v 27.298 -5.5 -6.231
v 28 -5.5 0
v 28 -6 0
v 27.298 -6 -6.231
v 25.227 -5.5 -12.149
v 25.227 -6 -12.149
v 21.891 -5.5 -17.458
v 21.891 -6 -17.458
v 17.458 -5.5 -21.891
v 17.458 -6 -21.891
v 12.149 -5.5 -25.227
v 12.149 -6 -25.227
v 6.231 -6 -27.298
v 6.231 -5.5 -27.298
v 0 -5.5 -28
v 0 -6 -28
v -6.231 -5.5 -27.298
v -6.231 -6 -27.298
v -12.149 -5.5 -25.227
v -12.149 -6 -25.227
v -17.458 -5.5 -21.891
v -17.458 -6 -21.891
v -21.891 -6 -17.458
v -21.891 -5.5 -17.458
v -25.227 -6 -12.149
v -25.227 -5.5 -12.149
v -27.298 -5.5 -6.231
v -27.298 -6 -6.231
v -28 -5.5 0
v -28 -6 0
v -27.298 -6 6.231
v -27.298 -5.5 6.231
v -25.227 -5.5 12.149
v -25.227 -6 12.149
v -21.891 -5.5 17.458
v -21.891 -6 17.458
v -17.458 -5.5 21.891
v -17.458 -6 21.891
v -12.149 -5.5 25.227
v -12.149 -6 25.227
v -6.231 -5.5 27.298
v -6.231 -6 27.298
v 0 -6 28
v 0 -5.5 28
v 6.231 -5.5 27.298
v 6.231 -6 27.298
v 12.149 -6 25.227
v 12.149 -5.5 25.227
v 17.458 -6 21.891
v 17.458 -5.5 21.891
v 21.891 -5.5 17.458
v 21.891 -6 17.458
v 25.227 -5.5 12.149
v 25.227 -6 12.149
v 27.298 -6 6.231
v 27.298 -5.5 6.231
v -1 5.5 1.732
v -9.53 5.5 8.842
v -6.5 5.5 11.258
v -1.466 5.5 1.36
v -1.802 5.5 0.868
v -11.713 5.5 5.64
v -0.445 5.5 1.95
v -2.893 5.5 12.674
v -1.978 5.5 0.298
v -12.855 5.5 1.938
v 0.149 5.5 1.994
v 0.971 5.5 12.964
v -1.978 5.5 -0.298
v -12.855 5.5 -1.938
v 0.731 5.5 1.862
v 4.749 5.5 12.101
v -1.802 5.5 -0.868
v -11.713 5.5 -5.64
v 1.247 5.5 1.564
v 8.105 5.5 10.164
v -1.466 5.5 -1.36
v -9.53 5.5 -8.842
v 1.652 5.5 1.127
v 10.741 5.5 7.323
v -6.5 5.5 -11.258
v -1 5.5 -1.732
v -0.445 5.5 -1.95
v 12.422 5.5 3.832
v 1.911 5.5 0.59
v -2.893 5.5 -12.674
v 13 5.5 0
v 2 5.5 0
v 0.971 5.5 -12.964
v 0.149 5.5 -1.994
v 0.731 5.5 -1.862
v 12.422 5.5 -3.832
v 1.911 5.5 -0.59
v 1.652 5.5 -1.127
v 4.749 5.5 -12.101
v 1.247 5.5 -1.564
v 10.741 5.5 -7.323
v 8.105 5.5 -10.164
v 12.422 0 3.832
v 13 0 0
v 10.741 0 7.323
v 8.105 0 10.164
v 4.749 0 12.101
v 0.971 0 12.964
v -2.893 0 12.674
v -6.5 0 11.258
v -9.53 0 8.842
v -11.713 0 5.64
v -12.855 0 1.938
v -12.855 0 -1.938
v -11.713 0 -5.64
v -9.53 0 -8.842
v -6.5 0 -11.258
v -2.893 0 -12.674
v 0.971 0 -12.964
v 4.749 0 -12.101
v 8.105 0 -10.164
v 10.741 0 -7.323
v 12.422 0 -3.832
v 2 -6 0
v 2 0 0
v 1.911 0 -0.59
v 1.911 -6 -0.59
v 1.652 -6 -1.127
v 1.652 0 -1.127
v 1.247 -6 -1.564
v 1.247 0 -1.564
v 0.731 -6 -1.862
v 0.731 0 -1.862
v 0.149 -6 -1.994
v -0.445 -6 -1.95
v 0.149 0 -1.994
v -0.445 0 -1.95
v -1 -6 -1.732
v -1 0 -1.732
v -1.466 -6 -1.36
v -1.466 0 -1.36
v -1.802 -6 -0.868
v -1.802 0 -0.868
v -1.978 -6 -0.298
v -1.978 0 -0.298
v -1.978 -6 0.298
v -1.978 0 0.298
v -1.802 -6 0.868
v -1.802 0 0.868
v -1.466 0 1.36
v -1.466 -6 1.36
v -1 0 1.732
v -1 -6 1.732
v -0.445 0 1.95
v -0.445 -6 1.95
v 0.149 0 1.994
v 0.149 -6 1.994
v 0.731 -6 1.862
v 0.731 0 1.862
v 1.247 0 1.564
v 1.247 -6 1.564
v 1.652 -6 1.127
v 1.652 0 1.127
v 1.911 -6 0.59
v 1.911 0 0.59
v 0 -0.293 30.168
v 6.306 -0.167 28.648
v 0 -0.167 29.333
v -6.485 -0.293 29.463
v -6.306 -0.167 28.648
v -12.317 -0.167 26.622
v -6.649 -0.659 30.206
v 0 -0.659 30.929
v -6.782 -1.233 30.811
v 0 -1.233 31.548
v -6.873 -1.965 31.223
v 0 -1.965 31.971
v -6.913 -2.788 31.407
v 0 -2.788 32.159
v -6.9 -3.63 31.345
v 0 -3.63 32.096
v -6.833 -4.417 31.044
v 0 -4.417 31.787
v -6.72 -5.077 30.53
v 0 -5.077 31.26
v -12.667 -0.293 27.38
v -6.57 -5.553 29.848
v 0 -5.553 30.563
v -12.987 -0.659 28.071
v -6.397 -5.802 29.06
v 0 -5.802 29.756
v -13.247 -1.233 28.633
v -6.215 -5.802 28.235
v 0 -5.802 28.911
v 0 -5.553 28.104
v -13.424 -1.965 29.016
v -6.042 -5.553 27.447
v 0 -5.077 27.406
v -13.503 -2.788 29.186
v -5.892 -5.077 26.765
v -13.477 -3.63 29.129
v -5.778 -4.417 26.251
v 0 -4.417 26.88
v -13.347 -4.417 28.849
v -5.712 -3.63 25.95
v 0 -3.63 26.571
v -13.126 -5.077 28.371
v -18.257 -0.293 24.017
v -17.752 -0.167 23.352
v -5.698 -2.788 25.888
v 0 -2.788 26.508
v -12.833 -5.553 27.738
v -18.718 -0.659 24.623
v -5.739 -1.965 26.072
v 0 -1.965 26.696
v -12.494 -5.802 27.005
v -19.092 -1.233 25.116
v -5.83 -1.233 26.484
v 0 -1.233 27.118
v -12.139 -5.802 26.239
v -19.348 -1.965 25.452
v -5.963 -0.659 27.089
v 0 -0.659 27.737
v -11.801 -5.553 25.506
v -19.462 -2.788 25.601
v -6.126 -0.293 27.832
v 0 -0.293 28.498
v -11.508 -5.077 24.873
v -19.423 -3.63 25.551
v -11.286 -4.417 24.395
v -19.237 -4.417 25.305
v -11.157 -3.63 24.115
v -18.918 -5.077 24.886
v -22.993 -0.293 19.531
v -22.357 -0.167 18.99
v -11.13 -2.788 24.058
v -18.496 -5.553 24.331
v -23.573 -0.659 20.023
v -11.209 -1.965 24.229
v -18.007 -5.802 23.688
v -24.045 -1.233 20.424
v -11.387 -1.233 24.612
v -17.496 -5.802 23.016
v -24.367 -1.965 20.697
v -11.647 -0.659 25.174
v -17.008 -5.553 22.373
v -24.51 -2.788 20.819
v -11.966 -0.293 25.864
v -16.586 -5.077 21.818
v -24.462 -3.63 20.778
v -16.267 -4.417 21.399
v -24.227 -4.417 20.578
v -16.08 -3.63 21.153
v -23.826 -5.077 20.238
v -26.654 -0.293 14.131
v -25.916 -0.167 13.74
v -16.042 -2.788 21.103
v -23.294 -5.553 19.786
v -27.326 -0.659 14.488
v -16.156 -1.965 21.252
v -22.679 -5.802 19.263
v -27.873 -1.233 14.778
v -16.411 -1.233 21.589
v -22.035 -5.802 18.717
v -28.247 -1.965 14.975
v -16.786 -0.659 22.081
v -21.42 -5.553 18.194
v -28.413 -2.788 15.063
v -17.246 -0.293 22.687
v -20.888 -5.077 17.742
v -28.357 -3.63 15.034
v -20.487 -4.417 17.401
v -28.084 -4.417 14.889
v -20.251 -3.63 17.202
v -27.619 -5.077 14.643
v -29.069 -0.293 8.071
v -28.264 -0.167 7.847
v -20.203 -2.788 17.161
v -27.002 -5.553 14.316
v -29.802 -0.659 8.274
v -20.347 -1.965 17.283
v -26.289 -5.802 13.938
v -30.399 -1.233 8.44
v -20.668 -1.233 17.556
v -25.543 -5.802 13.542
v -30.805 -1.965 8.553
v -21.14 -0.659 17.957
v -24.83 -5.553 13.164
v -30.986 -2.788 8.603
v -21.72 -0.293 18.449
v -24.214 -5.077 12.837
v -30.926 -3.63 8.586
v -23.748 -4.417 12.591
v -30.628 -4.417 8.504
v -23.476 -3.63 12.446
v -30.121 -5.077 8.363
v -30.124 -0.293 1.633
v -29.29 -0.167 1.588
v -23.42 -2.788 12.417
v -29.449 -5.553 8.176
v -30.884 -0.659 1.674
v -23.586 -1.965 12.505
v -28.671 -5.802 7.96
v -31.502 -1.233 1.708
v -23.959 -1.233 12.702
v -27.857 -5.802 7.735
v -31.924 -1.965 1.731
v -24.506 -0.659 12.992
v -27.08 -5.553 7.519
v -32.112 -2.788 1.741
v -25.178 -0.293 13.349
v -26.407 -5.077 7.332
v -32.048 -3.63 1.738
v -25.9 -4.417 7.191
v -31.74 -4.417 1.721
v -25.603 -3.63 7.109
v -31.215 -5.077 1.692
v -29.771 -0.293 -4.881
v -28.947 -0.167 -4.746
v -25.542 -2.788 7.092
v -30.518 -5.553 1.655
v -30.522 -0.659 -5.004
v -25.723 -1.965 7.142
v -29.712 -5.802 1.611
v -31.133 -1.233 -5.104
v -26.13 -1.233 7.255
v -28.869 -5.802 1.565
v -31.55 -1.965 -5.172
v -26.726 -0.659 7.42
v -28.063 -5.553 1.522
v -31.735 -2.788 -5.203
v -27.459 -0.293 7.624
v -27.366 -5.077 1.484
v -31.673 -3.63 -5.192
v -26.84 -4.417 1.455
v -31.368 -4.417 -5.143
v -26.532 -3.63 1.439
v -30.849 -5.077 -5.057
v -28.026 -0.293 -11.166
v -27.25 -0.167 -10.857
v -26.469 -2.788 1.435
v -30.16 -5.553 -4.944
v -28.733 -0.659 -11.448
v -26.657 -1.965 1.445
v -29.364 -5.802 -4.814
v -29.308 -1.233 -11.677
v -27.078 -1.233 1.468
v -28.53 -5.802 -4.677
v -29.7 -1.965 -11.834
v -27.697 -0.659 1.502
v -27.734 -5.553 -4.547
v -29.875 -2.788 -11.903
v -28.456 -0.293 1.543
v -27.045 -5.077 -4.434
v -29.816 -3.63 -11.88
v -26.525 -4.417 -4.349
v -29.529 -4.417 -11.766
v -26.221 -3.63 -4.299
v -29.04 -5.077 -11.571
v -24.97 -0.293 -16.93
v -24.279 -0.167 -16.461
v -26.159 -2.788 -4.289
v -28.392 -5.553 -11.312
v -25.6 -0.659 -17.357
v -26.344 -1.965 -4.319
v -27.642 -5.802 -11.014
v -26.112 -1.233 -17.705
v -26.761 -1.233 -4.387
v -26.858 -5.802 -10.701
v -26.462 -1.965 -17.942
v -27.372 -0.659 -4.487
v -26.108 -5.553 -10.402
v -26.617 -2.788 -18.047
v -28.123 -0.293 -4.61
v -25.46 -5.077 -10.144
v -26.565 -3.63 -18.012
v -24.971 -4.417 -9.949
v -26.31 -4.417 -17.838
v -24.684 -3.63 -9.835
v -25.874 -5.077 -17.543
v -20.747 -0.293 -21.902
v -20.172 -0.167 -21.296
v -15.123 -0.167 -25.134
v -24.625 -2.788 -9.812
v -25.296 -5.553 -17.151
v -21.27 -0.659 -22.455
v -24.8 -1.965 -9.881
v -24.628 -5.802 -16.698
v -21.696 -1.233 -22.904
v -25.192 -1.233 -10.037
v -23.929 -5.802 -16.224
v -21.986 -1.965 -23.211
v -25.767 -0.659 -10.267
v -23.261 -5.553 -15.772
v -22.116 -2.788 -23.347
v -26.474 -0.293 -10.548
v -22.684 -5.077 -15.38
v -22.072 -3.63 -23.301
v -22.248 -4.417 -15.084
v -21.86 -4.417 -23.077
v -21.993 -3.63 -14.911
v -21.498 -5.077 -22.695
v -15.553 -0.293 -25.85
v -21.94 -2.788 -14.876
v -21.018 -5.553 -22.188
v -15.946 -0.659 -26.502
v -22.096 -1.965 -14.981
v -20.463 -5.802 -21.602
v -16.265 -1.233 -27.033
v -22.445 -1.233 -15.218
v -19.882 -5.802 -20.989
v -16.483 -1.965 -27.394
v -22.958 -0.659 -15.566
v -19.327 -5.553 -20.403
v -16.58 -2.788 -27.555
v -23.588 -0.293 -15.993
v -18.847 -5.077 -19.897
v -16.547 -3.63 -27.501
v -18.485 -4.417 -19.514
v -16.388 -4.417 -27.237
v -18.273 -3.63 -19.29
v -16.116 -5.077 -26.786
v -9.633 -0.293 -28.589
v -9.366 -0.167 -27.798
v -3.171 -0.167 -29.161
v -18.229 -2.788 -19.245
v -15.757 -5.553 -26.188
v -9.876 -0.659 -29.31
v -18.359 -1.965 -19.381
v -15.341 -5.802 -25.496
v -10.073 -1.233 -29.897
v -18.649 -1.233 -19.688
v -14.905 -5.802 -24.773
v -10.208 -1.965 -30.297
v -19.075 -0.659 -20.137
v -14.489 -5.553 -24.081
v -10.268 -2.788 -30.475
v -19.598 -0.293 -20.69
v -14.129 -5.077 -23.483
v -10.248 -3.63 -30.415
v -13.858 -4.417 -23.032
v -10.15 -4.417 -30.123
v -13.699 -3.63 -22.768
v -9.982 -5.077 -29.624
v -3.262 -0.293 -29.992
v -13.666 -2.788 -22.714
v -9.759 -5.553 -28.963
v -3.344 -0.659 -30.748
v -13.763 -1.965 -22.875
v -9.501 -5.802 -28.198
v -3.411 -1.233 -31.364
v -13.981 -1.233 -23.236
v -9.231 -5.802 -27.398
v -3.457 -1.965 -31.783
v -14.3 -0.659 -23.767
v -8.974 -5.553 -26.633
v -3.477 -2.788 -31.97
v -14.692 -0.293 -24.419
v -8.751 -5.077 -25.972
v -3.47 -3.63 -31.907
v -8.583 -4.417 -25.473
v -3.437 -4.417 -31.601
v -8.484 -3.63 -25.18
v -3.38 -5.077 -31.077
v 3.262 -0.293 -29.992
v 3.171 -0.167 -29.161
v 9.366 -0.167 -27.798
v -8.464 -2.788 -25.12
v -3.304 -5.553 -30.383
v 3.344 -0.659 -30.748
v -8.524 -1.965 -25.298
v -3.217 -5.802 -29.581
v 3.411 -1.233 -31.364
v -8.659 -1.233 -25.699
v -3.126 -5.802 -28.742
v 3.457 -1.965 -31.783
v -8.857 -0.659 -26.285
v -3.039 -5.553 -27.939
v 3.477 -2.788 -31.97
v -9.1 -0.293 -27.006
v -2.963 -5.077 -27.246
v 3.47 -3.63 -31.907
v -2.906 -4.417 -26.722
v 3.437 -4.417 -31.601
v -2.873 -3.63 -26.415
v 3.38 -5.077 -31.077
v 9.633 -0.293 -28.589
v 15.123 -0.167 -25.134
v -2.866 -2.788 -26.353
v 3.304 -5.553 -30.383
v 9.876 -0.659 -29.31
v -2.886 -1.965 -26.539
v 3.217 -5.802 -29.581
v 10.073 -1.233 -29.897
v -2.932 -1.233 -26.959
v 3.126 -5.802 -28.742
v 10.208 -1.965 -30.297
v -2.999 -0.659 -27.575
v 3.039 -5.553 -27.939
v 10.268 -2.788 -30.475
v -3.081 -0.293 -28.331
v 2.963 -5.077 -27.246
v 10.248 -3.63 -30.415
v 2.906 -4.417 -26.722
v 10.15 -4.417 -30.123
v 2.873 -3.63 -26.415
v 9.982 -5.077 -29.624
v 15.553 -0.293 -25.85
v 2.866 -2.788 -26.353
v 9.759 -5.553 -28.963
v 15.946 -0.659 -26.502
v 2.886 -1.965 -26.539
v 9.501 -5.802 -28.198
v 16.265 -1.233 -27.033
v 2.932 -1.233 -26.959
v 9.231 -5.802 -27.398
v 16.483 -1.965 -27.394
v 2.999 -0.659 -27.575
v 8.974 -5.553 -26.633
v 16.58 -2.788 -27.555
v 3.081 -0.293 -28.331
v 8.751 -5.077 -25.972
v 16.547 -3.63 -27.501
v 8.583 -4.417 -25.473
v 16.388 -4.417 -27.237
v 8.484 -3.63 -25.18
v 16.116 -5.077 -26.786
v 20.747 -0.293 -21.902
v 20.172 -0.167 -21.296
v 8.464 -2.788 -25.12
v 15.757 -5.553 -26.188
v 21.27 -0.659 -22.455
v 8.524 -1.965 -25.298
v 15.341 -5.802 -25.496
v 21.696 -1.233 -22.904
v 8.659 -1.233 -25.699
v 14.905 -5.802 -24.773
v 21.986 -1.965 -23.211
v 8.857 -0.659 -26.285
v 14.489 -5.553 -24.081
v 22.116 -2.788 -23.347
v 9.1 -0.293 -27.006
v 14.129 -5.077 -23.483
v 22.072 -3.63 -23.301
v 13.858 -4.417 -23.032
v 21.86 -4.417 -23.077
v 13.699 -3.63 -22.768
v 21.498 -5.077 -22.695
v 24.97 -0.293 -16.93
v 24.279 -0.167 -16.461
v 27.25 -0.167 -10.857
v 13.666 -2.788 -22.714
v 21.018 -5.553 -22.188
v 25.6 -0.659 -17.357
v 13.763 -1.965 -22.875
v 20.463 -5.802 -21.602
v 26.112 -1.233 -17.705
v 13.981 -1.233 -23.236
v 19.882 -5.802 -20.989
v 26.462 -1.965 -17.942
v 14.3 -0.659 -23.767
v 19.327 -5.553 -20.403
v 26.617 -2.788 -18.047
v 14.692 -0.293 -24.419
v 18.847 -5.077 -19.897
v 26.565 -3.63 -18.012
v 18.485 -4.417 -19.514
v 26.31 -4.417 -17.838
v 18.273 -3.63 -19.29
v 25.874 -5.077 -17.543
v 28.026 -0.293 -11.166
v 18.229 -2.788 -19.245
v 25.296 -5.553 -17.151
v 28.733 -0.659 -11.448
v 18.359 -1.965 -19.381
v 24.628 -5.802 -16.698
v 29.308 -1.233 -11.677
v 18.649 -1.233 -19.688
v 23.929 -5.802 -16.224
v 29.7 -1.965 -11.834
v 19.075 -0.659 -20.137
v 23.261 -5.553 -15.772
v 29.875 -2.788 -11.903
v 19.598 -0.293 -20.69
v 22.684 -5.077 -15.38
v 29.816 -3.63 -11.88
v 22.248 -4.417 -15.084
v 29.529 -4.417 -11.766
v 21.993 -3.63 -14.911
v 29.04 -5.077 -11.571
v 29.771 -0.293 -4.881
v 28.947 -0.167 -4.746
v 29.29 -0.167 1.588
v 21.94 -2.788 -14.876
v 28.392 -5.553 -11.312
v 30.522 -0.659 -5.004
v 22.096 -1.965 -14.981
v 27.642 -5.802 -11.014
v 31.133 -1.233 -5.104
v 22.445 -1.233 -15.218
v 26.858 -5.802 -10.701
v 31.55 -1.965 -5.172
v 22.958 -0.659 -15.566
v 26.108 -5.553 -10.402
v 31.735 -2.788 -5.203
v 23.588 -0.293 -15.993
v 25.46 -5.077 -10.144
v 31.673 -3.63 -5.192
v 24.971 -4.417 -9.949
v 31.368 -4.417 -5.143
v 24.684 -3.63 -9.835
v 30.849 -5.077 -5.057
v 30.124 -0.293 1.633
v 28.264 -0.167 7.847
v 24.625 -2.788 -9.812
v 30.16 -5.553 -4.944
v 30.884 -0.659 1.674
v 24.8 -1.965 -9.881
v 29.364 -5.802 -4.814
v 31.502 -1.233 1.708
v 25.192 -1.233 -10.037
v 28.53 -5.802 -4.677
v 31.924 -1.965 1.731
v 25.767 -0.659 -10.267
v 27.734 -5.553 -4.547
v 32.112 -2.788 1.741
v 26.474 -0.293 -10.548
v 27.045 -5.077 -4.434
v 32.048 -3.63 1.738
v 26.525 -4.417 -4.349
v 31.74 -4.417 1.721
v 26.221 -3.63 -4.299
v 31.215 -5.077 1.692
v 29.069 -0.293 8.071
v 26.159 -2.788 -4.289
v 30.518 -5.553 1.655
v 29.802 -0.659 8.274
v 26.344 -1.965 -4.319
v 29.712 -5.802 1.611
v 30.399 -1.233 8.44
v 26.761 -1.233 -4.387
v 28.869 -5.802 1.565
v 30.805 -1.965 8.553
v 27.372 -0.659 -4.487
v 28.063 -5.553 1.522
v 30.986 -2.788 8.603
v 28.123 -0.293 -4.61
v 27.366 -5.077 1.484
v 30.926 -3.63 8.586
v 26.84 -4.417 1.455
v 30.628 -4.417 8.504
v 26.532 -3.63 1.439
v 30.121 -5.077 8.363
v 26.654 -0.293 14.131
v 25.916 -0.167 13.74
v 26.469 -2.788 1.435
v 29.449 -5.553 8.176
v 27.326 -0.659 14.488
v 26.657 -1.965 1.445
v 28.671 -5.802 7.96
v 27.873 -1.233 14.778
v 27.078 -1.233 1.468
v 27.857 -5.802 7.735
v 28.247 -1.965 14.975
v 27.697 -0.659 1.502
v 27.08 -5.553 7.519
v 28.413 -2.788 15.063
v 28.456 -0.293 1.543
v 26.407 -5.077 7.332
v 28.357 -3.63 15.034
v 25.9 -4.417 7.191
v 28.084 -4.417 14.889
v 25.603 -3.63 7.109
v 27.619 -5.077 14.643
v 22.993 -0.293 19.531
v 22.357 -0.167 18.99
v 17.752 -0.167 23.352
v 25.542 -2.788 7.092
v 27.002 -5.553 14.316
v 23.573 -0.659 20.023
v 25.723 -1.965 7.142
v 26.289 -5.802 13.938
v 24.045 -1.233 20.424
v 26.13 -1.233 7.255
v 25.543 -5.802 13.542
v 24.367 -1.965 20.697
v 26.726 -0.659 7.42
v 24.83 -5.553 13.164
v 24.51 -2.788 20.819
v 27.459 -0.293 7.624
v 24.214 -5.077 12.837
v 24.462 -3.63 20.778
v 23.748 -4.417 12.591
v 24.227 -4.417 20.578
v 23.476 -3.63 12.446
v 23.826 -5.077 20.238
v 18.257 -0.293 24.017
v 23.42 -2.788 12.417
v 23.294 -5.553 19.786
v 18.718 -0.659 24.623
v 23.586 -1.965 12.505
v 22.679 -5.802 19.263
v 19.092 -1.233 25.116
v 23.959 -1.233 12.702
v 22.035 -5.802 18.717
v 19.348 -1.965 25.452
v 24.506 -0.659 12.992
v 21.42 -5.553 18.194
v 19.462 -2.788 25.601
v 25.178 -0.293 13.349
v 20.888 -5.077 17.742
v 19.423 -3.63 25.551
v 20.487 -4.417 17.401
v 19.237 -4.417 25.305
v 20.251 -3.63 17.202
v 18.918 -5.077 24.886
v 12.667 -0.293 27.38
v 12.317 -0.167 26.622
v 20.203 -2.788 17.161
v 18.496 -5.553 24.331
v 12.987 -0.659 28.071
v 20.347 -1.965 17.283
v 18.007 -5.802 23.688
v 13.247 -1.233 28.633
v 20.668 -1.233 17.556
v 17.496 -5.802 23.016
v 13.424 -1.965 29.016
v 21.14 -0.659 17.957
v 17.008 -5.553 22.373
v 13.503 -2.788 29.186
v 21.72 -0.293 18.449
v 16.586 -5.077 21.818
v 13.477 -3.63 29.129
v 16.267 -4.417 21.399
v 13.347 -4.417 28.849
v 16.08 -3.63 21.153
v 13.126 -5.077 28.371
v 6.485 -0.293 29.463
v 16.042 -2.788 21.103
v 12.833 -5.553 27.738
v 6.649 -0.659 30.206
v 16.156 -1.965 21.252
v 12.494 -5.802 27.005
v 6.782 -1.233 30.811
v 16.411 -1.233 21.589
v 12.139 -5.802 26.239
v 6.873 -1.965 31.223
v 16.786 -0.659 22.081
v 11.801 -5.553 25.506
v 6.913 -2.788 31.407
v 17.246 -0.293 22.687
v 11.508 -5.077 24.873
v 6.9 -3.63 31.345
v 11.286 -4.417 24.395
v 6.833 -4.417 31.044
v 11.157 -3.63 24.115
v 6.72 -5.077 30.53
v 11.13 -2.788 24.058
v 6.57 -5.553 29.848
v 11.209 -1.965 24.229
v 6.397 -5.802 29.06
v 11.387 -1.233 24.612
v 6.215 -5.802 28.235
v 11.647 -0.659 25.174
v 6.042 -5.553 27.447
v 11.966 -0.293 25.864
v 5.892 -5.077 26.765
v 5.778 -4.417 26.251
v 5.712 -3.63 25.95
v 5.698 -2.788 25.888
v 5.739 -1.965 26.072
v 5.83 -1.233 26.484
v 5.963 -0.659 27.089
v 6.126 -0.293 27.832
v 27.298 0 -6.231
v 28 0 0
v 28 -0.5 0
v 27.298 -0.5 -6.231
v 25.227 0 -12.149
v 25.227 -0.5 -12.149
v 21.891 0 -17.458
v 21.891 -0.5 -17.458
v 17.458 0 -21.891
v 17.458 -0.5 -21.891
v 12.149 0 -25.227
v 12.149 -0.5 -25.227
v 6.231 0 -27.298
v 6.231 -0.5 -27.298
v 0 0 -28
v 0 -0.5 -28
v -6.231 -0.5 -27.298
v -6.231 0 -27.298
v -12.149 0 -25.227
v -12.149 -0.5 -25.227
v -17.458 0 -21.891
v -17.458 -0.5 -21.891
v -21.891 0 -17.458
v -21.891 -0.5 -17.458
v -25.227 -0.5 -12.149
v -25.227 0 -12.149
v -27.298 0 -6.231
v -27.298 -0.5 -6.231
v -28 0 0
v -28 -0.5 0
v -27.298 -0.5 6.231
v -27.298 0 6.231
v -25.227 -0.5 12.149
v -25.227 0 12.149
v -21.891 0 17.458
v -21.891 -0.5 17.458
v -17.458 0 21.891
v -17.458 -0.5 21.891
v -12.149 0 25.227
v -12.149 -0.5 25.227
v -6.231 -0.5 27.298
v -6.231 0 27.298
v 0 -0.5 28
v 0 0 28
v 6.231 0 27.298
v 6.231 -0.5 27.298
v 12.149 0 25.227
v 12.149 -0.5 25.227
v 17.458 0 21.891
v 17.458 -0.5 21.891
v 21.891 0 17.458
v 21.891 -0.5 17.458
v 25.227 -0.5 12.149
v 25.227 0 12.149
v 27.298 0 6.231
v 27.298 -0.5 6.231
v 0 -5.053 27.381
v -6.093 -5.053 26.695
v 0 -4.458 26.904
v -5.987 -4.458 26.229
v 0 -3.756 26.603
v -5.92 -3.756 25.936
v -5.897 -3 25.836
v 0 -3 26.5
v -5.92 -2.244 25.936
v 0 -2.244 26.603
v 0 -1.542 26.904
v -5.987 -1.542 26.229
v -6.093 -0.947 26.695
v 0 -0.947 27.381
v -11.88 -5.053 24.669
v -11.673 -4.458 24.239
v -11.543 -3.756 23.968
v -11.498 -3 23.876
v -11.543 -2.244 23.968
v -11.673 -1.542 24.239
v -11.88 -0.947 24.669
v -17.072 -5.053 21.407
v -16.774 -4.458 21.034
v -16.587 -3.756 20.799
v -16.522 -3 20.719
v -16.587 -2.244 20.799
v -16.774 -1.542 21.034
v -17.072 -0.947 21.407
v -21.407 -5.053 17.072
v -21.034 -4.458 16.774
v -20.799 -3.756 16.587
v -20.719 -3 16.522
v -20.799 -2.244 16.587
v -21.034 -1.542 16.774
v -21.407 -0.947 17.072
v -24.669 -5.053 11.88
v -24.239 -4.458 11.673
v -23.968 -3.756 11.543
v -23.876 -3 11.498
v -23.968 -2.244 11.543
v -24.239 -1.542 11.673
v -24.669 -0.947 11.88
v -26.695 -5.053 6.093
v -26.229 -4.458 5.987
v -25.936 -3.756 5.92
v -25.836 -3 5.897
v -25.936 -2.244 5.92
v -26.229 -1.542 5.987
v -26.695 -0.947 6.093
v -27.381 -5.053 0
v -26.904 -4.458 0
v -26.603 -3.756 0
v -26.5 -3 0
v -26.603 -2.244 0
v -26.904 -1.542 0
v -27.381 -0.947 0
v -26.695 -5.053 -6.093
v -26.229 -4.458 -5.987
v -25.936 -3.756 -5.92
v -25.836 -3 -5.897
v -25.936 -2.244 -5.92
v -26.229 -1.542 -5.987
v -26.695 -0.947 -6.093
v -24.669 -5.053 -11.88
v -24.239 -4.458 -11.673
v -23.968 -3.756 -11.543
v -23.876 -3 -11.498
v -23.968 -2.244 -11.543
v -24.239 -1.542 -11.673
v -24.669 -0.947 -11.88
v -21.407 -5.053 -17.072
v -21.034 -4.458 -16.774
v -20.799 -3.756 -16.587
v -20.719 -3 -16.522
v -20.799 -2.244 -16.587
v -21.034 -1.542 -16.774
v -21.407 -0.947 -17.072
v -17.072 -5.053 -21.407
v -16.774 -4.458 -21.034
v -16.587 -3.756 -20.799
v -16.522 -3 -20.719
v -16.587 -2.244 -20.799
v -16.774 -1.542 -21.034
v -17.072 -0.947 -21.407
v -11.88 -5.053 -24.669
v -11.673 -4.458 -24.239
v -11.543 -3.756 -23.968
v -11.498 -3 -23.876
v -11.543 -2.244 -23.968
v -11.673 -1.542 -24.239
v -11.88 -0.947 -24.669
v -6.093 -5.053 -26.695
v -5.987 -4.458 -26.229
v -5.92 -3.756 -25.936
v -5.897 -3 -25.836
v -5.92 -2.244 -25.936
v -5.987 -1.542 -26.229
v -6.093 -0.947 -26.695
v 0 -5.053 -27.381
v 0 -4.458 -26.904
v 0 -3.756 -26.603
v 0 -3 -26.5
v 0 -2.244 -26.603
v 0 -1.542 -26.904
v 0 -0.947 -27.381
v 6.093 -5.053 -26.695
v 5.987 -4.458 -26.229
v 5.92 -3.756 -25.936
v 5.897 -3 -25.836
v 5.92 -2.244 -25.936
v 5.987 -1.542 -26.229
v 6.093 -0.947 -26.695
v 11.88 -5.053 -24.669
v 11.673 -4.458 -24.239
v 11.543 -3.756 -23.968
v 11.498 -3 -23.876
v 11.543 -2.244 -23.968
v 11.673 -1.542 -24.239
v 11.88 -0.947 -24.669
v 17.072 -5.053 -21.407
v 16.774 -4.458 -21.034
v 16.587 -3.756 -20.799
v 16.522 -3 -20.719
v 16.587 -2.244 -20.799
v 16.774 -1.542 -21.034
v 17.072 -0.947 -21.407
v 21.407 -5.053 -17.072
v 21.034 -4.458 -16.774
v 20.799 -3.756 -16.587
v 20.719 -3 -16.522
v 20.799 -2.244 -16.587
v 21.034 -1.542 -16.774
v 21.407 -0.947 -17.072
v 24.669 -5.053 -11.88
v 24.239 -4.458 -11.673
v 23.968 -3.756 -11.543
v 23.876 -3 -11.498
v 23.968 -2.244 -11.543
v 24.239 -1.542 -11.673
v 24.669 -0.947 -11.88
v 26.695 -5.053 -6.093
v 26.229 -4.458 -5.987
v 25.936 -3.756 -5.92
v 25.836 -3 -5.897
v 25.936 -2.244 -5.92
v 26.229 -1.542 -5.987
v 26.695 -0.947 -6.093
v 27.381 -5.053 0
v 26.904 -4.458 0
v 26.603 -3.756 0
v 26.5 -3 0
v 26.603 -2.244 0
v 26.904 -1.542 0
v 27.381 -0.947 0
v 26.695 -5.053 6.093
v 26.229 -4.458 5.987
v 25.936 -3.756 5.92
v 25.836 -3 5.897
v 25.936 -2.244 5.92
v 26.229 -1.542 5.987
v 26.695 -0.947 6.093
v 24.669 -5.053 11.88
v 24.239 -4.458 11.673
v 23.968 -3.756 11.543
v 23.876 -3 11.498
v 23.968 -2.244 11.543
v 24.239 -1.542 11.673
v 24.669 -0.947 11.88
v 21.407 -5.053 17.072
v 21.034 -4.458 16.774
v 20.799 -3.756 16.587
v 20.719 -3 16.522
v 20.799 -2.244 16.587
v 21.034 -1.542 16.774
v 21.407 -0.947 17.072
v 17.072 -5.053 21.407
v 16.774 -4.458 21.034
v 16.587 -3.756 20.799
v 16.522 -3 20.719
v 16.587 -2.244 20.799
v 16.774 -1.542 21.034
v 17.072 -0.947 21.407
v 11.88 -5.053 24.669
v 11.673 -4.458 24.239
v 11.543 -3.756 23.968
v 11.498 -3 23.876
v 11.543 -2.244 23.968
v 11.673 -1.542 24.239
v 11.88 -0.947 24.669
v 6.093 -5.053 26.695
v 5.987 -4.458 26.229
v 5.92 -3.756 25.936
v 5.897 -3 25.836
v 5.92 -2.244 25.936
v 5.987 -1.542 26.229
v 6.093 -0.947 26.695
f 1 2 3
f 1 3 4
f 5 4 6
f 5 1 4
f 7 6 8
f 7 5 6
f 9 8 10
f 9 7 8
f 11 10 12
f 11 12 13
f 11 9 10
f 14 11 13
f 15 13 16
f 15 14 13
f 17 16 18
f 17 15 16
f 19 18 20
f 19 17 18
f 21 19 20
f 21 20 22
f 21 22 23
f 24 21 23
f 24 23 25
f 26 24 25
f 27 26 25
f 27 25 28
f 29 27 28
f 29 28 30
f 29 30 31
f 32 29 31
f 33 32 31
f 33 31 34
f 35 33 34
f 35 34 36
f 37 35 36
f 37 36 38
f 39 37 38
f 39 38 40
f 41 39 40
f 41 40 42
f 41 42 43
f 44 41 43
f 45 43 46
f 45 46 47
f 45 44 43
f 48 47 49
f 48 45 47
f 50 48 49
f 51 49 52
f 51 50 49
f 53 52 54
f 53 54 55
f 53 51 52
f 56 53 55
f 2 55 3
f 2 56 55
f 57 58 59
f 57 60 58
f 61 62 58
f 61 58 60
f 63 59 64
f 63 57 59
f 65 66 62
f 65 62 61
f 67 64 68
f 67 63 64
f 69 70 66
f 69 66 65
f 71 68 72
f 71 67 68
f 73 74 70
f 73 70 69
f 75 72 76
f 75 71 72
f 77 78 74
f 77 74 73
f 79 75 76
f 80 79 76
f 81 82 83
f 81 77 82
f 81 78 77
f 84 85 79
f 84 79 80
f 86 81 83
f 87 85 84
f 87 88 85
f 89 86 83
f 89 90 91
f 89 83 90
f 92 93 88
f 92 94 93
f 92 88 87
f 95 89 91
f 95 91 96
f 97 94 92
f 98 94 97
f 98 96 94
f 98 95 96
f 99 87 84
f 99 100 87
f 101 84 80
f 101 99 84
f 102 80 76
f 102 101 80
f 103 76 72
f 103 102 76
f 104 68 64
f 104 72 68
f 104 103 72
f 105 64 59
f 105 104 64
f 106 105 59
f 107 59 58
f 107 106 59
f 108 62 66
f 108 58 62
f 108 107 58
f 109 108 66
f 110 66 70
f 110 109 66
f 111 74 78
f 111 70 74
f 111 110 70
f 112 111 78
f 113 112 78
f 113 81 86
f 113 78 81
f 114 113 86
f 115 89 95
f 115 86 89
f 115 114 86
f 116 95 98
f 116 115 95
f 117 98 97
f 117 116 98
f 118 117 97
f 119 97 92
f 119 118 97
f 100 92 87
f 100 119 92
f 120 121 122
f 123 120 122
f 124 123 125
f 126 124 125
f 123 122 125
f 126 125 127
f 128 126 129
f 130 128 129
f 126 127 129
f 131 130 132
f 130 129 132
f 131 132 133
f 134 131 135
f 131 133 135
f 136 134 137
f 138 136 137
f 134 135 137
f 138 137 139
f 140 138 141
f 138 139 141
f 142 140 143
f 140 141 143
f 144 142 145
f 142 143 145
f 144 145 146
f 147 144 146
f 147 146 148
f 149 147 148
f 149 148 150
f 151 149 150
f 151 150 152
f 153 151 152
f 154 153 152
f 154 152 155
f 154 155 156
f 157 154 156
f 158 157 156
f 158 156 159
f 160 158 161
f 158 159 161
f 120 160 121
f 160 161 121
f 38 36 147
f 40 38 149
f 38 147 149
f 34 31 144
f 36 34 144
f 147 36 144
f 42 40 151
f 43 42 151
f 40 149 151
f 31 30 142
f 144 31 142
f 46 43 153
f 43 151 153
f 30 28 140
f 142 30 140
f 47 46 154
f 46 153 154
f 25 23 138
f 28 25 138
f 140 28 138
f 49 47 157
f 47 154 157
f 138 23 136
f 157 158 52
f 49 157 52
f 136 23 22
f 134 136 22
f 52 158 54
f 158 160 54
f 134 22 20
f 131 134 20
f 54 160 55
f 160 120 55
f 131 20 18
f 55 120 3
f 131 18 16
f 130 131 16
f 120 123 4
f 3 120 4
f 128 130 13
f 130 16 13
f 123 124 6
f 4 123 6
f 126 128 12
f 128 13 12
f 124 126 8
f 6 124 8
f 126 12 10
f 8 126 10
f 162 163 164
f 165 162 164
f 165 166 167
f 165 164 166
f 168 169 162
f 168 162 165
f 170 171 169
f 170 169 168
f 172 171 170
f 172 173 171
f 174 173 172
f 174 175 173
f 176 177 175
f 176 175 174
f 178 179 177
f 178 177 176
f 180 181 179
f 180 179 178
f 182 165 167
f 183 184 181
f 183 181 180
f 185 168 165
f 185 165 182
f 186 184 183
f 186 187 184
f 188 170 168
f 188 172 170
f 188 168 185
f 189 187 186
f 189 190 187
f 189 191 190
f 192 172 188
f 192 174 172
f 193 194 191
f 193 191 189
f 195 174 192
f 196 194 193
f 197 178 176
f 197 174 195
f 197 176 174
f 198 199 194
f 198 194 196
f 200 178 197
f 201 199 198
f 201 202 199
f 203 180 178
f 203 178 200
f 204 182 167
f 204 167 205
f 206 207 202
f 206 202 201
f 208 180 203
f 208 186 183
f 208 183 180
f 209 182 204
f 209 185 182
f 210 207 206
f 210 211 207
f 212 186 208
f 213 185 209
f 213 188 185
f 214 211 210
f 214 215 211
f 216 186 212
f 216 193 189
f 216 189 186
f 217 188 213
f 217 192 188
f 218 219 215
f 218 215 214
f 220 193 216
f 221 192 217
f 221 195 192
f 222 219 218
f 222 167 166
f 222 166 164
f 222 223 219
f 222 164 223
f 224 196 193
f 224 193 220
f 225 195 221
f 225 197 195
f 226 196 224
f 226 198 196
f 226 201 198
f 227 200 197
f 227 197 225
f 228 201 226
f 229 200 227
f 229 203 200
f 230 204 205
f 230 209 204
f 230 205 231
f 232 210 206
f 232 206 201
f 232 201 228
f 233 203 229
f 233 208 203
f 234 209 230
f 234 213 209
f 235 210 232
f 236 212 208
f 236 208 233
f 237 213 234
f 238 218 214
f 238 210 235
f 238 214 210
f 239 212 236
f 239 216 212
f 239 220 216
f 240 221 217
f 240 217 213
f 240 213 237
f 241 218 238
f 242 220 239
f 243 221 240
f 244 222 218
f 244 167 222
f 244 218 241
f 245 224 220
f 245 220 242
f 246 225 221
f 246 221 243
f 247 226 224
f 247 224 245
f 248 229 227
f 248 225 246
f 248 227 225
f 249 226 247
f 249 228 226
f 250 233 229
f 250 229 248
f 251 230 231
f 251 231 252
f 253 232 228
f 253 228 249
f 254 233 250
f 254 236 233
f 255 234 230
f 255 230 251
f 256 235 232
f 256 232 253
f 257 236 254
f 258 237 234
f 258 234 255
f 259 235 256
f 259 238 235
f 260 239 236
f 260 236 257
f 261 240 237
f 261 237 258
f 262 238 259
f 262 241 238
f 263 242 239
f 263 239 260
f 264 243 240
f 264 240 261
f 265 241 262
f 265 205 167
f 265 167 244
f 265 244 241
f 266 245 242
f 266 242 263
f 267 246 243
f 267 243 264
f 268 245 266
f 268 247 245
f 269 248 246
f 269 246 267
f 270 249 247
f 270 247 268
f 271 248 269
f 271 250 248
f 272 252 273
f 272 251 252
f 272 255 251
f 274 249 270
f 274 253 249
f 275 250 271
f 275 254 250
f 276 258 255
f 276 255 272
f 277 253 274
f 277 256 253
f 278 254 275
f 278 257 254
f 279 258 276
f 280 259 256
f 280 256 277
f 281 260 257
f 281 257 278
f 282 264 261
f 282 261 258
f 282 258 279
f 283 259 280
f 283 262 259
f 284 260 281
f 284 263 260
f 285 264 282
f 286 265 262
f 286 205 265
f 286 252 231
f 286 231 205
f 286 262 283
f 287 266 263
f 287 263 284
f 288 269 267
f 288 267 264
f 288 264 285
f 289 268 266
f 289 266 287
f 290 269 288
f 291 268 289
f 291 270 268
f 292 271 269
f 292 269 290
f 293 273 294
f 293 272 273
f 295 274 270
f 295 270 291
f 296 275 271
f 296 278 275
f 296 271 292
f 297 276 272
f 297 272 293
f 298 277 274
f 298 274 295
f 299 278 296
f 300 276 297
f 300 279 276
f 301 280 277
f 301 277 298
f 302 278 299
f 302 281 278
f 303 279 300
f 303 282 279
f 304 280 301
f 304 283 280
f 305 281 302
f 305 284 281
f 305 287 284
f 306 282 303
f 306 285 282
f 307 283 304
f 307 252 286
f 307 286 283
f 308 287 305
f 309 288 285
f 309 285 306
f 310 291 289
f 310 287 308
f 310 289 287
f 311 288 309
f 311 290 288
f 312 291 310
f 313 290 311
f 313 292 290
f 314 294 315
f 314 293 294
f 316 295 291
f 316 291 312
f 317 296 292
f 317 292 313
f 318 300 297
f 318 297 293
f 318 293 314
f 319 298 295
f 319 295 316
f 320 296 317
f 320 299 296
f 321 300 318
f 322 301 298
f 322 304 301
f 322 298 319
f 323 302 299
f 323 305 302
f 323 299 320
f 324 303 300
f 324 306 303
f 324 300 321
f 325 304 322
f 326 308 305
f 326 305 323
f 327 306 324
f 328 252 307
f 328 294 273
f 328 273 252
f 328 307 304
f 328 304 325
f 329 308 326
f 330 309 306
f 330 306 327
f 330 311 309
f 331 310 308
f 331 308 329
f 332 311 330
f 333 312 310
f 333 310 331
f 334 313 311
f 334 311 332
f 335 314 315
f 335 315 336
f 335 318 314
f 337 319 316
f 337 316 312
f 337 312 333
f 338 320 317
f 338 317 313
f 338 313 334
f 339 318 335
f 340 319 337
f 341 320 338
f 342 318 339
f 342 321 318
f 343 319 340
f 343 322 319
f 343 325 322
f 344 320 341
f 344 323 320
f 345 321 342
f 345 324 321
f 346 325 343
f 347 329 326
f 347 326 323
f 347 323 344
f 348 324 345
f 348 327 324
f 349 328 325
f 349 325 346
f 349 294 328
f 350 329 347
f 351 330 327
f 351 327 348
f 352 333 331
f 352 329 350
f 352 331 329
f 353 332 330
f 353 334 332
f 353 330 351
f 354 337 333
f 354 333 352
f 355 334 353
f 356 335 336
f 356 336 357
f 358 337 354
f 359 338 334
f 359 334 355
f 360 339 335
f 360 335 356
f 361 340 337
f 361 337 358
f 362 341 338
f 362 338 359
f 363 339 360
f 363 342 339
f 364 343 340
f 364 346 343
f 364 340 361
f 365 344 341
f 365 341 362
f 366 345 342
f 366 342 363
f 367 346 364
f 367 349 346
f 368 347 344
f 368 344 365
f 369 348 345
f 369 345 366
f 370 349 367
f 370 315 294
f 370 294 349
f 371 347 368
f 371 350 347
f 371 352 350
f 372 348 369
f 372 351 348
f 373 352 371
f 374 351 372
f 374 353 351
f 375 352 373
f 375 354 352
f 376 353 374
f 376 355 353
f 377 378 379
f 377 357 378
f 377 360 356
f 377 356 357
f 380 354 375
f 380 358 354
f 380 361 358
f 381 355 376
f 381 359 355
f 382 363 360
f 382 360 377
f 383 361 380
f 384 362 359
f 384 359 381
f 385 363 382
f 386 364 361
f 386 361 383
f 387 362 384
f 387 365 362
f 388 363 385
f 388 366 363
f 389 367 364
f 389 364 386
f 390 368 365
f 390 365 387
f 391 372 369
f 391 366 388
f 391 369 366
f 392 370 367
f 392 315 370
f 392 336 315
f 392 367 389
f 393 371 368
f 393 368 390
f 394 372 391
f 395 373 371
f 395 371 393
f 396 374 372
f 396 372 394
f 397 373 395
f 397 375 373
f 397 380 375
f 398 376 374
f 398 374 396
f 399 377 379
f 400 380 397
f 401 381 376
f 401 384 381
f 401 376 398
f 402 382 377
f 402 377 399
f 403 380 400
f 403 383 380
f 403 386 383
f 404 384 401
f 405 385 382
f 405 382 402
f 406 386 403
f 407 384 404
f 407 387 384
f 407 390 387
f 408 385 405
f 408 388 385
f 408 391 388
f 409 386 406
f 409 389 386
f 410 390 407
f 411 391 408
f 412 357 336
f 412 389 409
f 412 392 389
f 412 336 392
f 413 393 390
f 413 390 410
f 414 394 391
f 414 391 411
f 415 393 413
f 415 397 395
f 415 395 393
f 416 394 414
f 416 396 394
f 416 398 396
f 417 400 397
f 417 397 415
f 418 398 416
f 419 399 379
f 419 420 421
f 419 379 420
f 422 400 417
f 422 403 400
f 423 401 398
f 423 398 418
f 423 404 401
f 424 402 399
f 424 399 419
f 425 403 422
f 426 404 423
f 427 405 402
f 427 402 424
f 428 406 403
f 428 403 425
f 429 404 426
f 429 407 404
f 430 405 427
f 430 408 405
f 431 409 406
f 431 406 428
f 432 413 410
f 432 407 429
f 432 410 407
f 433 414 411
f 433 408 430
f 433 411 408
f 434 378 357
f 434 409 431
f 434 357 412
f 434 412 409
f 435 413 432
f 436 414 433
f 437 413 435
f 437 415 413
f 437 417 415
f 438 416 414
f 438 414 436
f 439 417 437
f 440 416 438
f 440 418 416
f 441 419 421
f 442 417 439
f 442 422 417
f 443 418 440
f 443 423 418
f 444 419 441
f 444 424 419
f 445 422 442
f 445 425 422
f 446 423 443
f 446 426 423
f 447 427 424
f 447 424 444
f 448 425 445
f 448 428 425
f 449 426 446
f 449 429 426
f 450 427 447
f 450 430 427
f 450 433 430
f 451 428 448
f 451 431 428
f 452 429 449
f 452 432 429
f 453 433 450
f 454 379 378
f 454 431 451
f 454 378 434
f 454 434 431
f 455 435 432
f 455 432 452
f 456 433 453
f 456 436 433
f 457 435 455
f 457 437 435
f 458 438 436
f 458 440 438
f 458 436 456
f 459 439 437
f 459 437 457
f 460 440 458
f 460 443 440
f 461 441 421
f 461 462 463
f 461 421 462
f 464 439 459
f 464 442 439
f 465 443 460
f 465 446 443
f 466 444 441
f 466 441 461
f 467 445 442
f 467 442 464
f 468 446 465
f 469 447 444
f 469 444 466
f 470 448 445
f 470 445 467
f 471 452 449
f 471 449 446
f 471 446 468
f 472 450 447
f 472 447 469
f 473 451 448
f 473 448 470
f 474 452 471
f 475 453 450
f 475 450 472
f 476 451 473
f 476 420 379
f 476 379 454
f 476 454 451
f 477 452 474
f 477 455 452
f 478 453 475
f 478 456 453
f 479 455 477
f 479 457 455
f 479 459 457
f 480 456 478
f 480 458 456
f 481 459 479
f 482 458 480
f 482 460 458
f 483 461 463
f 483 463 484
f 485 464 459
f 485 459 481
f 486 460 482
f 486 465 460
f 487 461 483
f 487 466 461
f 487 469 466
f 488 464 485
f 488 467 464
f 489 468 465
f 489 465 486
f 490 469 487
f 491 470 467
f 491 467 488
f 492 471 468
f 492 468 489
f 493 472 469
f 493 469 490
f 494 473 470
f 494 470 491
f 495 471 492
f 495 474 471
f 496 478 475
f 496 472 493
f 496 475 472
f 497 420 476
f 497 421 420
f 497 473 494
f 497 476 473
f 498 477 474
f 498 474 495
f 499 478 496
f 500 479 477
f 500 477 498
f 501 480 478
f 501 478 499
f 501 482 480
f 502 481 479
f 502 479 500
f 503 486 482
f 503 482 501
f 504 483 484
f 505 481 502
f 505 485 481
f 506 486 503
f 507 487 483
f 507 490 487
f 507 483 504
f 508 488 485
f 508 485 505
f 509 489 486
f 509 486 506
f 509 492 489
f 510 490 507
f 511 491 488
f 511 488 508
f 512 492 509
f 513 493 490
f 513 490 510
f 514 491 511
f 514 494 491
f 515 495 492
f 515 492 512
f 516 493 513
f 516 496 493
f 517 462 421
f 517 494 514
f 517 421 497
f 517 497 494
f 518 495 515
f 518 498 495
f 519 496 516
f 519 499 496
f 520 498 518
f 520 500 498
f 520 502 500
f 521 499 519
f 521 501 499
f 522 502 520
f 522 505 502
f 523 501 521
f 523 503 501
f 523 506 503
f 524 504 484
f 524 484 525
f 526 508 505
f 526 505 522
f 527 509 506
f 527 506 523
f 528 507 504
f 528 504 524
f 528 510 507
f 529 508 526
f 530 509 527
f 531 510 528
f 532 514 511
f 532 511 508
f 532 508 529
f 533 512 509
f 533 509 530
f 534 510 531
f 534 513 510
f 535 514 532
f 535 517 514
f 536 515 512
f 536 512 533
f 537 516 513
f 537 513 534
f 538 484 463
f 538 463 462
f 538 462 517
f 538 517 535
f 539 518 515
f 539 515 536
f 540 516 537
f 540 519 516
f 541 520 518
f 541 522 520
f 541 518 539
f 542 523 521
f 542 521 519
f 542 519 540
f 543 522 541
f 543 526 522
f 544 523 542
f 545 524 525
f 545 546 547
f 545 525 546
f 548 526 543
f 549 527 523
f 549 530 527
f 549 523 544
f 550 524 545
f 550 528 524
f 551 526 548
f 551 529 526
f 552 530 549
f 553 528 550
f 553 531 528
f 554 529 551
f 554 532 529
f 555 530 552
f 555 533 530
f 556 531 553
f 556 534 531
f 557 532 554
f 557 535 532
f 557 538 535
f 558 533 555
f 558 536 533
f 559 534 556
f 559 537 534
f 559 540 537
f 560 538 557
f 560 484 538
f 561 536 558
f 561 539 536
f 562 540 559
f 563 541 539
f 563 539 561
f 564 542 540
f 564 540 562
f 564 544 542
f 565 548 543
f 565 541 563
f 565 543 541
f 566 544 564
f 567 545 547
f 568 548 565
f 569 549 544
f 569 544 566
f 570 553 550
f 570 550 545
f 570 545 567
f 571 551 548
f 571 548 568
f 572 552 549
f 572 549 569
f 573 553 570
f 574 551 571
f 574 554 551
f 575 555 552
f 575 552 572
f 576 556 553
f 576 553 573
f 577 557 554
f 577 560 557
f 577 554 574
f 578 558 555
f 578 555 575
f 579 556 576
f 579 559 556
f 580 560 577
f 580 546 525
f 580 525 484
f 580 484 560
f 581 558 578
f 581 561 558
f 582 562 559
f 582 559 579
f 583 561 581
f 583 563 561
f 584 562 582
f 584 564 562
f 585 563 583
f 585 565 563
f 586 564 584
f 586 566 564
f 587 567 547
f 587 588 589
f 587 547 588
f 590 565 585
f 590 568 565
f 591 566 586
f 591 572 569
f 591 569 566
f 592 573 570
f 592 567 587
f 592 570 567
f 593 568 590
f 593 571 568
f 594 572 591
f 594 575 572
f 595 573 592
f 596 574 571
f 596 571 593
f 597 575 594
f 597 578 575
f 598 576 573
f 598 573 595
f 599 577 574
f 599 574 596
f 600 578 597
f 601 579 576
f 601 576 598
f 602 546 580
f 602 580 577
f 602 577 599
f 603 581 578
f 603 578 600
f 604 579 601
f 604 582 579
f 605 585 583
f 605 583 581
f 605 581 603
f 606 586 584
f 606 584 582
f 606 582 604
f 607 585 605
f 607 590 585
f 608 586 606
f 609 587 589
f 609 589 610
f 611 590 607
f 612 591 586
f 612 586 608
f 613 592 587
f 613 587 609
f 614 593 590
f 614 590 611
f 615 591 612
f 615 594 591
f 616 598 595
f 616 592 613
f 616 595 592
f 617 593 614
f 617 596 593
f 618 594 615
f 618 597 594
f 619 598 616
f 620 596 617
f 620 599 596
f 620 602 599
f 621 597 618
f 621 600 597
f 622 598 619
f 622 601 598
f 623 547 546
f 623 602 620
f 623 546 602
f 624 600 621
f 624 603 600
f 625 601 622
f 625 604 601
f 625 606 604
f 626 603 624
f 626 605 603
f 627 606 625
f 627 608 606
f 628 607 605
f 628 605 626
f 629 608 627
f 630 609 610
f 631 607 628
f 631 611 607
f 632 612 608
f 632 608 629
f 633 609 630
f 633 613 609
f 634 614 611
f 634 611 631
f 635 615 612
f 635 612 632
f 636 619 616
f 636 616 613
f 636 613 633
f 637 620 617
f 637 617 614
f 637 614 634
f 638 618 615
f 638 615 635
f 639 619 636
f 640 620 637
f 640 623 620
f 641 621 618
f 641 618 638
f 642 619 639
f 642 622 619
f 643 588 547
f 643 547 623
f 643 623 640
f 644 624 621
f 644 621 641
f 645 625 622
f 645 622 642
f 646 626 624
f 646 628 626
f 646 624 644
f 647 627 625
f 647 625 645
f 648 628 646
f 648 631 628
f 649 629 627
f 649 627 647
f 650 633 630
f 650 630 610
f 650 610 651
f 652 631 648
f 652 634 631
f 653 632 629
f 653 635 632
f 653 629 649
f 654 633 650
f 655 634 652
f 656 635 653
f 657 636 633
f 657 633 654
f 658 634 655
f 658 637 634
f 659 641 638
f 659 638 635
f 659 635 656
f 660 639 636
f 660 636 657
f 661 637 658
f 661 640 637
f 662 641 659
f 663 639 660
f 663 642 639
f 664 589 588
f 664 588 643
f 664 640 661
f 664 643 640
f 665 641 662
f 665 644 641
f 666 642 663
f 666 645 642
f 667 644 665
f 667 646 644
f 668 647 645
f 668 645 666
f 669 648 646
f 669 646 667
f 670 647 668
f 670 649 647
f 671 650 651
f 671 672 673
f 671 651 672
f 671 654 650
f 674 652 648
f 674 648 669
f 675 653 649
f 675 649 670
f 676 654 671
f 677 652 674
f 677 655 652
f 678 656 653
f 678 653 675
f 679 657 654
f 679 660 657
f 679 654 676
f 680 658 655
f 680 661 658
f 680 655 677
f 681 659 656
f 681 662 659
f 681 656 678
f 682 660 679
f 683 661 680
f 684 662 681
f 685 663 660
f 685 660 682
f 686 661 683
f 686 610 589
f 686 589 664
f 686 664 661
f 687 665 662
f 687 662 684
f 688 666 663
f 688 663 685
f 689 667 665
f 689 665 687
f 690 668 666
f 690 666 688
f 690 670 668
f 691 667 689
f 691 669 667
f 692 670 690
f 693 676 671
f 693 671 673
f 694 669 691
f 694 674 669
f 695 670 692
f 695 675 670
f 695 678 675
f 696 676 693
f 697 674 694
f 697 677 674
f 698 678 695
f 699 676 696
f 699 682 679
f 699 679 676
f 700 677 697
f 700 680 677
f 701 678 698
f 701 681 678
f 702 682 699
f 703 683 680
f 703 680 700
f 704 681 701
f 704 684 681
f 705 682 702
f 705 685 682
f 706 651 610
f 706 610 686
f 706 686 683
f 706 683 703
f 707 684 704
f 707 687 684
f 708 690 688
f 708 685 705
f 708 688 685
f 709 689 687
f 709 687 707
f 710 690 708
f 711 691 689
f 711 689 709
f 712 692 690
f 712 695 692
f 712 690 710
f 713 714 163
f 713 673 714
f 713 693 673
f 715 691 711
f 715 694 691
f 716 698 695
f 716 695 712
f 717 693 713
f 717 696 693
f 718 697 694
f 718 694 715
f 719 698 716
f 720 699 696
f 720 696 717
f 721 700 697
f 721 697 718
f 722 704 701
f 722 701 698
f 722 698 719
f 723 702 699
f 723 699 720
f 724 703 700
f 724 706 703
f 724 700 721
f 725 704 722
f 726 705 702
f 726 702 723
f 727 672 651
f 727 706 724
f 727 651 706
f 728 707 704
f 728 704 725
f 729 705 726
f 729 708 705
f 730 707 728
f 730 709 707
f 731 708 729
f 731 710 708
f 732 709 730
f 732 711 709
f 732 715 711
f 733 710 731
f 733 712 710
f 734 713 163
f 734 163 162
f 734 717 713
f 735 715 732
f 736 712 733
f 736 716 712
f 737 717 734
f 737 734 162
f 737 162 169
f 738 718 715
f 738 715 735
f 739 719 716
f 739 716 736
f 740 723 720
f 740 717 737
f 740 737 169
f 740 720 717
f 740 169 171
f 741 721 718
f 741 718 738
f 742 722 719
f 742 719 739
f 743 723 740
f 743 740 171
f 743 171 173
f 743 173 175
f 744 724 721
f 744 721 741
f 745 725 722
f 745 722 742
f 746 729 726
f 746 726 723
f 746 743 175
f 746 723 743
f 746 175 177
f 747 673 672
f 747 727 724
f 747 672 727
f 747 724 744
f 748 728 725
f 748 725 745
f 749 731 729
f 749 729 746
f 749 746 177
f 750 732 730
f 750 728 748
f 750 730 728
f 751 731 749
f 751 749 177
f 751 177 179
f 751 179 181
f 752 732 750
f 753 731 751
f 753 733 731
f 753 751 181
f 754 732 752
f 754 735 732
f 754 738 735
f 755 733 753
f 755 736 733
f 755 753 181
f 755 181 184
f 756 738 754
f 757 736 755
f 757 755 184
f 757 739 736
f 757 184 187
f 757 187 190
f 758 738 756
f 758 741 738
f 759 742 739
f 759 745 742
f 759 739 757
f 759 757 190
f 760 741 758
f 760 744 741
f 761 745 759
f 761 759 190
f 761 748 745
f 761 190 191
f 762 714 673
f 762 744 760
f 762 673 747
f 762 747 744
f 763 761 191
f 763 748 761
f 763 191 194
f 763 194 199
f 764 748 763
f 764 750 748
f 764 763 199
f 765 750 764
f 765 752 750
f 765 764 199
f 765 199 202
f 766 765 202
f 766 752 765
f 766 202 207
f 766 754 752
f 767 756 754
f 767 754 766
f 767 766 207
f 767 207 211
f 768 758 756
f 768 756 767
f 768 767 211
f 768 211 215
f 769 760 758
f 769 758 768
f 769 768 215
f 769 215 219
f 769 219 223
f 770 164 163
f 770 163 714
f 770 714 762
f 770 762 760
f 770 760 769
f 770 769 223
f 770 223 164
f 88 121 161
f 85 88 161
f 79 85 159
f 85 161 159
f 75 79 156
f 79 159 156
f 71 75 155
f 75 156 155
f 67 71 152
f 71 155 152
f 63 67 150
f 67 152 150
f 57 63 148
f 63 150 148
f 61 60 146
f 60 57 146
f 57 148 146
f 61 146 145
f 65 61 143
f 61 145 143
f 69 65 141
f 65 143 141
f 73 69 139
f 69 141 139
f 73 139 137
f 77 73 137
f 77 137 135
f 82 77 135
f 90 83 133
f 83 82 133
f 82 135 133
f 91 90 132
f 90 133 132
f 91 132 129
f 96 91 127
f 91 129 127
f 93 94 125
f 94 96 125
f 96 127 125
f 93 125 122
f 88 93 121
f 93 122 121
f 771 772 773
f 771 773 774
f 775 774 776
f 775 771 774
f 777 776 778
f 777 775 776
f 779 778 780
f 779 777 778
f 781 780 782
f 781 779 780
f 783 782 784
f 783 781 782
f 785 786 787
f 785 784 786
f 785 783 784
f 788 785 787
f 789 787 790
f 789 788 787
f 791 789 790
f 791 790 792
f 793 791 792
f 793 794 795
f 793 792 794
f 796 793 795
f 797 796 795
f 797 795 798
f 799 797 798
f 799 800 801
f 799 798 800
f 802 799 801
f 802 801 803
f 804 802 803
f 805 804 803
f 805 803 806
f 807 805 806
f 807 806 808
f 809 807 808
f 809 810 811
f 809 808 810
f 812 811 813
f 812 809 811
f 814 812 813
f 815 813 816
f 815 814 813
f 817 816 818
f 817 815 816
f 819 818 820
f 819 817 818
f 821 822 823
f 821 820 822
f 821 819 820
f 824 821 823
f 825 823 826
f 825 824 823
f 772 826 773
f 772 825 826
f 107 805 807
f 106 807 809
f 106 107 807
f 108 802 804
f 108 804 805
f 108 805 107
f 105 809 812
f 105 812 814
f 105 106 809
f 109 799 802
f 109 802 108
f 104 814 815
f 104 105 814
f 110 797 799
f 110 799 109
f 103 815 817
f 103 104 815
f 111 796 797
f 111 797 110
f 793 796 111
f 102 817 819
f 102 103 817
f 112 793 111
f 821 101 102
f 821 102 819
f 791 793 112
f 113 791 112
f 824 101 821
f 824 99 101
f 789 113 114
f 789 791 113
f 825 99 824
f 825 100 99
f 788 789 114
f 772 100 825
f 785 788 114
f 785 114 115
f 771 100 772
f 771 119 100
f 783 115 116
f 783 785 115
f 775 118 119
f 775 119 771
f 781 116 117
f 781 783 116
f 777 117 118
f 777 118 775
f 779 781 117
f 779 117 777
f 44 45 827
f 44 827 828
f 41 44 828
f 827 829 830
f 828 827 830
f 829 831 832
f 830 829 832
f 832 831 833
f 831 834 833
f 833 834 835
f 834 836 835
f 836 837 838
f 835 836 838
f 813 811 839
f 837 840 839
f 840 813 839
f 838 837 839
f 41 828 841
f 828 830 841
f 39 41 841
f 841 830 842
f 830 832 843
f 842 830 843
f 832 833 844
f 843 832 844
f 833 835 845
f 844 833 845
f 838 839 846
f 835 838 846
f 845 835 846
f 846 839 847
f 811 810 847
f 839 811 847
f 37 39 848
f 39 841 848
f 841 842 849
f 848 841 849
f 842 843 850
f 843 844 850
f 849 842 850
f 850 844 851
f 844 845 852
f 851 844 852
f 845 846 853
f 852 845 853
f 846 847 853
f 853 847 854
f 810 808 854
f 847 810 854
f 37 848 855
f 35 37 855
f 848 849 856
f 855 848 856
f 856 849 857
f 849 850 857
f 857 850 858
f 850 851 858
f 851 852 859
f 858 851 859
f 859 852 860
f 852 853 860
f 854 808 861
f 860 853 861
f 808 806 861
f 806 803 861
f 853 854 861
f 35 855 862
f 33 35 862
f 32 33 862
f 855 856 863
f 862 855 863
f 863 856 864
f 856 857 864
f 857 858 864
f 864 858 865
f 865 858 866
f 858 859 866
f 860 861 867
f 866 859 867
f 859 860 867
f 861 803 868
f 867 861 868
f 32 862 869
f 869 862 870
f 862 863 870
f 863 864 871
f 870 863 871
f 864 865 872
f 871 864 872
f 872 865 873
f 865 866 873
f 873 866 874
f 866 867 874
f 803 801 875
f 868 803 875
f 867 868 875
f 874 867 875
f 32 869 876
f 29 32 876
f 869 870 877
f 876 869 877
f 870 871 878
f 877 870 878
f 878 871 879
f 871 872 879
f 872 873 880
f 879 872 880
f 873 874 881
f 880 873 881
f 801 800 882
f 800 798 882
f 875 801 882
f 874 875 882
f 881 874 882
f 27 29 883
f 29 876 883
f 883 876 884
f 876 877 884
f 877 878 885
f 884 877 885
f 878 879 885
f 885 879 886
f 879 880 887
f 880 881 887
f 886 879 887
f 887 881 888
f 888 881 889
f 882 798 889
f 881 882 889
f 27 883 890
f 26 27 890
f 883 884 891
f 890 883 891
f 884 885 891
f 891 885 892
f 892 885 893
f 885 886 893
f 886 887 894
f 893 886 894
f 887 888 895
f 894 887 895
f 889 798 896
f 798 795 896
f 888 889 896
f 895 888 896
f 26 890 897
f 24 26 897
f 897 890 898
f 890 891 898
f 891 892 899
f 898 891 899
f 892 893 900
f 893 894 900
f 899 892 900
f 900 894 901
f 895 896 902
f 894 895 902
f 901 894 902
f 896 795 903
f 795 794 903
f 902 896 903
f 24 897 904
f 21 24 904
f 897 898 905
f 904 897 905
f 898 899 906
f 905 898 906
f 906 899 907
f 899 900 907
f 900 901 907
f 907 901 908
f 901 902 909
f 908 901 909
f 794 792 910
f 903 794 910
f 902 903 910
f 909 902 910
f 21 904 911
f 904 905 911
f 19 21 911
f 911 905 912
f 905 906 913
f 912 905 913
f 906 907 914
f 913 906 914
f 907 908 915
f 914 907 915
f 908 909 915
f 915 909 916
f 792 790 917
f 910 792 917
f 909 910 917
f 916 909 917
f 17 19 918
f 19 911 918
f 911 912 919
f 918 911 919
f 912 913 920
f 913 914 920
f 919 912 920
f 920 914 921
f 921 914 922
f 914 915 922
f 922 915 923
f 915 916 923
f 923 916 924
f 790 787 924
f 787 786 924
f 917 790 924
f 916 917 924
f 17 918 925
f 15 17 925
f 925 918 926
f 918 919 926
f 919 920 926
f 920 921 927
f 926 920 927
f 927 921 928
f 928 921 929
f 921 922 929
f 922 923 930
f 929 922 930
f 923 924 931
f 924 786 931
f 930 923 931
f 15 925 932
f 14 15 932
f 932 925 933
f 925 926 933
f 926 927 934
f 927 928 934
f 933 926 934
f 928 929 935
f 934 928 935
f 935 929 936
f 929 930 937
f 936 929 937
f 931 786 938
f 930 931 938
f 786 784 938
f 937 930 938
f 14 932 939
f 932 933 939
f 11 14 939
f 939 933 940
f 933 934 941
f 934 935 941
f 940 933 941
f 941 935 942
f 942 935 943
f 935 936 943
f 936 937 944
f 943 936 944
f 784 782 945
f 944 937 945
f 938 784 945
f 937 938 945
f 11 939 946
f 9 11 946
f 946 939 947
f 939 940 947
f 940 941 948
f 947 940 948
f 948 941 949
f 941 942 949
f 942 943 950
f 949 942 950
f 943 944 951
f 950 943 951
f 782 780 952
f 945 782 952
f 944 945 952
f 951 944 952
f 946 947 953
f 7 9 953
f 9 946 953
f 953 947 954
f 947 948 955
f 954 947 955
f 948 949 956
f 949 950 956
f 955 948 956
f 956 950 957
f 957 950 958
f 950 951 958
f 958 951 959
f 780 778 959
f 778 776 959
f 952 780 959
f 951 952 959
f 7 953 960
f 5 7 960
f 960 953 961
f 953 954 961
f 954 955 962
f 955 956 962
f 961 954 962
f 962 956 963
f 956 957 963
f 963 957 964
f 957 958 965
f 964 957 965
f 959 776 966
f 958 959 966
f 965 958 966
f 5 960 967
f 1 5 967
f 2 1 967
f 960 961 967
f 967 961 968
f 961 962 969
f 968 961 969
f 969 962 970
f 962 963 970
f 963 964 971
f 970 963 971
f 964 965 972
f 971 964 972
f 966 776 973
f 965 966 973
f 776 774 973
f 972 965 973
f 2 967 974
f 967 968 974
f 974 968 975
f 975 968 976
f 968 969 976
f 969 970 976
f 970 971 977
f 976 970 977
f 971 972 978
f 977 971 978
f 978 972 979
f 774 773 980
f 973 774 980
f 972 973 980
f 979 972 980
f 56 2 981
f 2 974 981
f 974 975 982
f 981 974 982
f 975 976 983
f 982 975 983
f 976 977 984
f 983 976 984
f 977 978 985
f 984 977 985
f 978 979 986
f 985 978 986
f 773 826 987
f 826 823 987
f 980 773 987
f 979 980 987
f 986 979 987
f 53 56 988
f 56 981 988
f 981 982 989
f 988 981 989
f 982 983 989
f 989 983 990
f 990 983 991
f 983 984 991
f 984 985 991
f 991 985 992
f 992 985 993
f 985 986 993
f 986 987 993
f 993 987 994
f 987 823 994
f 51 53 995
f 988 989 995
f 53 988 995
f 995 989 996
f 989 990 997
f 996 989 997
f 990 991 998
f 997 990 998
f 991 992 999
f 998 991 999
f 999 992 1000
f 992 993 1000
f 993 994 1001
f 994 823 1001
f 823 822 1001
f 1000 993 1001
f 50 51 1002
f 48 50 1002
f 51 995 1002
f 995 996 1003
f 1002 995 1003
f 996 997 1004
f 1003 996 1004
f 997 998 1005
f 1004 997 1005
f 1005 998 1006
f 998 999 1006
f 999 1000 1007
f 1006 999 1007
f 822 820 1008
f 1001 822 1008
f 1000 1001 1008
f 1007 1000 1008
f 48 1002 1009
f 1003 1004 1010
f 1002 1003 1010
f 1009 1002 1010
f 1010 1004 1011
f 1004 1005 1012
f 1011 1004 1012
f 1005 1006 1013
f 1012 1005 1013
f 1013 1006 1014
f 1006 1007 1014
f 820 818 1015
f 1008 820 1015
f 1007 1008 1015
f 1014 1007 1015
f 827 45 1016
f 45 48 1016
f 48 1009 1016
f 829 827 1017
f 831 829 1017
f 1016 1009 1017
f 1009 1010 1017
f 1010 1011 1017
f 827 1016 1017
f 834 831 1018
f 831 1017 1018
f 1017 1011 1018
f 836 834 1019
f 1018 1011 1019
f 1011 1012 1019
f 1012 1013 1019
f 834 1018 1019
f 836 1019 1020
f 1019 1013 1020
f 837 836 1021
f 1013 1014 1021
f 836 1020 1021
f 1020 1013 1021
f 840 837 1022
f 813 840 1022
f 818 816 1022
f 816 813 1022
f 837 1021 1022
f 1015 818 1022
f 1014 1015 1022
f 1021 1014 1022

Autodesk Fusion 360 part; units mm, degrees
sketch "Sketch1" plane through (0, 0, 0) normal (0, 1, 0) x (1, 0, 0) in component "hub"
  circle A0 centre (0, 0) radius 28
  circle A1 centre (0, 0) radius 13
  circle A2 centre (0, 0) radius 2
  dimension "d1" = 56
  dimension "d2" = 26
  dimension "d3" = 4
extrude "Extrude1" add sketch "Sketch1" against normal blind 6 contours A0 | A1 | A2 makes body 1 in component "hub"
extrude "Extrude2" add sketch "Sketch1" along normal blind 5.5 contours A1 bodies 1 in component "hub"
extrude "Extrude3" cut 1 faces at (0.637, 0, -0.1965) along direction (0, -1, 0) through all on bodies 1 bodies 1 in component "hub"
sketch "Sketch2" plane through (0, 0, 0) normal (1, 0, 0) x (0, -1, 0) in component "hub"
  line L0 (6, -28) -> (6, 28) construction
  line L1 (0, 28) -> (0, -28) construction
  line L2 (6, -28) -> (5.5, -28) construction
  line L3 (0, -28) -> (0.5, -28) construction
  line L4 (5.5, -28) -> (0.5, -28) construction
  line L5 (3, -28) -> (3, -26.5) construction
  circle A0 centre (3, -29.3333) radius 2.8333
  dimension "d8" = 0.5
  dimension "d9" = 0.5
  dimension "d10" = 1.5
revolve "Revolve1" cut sketch "Sketch2" angle 360 about axis through (0, 1.75, 0) along (0, 1, 0) bodies 1 in component "hub"
sketch "Sketch1 (2)" plane through (0, 0, 0) normal (1, 0, 0) x (0, 1, 0) in component "wheel"
  circle A0 centre (-3, 29.3333) radius 2.8333
revolve "Revolve1'" add sketch "Sketch1 (2)" angle 360 about axis through (0, 1.75, 0) along (0, 1, 0) separate body makes body 2 in component "wheel"
component "hub" placed x (1, 0, 0) y (0, 1, 0) z (0, 0, 1) at (0, 0, 0)
component "wheel" placed x (1, 0, 0) y (0, 1, 0) z (0, 0, 1) at (0, 0, 0)
